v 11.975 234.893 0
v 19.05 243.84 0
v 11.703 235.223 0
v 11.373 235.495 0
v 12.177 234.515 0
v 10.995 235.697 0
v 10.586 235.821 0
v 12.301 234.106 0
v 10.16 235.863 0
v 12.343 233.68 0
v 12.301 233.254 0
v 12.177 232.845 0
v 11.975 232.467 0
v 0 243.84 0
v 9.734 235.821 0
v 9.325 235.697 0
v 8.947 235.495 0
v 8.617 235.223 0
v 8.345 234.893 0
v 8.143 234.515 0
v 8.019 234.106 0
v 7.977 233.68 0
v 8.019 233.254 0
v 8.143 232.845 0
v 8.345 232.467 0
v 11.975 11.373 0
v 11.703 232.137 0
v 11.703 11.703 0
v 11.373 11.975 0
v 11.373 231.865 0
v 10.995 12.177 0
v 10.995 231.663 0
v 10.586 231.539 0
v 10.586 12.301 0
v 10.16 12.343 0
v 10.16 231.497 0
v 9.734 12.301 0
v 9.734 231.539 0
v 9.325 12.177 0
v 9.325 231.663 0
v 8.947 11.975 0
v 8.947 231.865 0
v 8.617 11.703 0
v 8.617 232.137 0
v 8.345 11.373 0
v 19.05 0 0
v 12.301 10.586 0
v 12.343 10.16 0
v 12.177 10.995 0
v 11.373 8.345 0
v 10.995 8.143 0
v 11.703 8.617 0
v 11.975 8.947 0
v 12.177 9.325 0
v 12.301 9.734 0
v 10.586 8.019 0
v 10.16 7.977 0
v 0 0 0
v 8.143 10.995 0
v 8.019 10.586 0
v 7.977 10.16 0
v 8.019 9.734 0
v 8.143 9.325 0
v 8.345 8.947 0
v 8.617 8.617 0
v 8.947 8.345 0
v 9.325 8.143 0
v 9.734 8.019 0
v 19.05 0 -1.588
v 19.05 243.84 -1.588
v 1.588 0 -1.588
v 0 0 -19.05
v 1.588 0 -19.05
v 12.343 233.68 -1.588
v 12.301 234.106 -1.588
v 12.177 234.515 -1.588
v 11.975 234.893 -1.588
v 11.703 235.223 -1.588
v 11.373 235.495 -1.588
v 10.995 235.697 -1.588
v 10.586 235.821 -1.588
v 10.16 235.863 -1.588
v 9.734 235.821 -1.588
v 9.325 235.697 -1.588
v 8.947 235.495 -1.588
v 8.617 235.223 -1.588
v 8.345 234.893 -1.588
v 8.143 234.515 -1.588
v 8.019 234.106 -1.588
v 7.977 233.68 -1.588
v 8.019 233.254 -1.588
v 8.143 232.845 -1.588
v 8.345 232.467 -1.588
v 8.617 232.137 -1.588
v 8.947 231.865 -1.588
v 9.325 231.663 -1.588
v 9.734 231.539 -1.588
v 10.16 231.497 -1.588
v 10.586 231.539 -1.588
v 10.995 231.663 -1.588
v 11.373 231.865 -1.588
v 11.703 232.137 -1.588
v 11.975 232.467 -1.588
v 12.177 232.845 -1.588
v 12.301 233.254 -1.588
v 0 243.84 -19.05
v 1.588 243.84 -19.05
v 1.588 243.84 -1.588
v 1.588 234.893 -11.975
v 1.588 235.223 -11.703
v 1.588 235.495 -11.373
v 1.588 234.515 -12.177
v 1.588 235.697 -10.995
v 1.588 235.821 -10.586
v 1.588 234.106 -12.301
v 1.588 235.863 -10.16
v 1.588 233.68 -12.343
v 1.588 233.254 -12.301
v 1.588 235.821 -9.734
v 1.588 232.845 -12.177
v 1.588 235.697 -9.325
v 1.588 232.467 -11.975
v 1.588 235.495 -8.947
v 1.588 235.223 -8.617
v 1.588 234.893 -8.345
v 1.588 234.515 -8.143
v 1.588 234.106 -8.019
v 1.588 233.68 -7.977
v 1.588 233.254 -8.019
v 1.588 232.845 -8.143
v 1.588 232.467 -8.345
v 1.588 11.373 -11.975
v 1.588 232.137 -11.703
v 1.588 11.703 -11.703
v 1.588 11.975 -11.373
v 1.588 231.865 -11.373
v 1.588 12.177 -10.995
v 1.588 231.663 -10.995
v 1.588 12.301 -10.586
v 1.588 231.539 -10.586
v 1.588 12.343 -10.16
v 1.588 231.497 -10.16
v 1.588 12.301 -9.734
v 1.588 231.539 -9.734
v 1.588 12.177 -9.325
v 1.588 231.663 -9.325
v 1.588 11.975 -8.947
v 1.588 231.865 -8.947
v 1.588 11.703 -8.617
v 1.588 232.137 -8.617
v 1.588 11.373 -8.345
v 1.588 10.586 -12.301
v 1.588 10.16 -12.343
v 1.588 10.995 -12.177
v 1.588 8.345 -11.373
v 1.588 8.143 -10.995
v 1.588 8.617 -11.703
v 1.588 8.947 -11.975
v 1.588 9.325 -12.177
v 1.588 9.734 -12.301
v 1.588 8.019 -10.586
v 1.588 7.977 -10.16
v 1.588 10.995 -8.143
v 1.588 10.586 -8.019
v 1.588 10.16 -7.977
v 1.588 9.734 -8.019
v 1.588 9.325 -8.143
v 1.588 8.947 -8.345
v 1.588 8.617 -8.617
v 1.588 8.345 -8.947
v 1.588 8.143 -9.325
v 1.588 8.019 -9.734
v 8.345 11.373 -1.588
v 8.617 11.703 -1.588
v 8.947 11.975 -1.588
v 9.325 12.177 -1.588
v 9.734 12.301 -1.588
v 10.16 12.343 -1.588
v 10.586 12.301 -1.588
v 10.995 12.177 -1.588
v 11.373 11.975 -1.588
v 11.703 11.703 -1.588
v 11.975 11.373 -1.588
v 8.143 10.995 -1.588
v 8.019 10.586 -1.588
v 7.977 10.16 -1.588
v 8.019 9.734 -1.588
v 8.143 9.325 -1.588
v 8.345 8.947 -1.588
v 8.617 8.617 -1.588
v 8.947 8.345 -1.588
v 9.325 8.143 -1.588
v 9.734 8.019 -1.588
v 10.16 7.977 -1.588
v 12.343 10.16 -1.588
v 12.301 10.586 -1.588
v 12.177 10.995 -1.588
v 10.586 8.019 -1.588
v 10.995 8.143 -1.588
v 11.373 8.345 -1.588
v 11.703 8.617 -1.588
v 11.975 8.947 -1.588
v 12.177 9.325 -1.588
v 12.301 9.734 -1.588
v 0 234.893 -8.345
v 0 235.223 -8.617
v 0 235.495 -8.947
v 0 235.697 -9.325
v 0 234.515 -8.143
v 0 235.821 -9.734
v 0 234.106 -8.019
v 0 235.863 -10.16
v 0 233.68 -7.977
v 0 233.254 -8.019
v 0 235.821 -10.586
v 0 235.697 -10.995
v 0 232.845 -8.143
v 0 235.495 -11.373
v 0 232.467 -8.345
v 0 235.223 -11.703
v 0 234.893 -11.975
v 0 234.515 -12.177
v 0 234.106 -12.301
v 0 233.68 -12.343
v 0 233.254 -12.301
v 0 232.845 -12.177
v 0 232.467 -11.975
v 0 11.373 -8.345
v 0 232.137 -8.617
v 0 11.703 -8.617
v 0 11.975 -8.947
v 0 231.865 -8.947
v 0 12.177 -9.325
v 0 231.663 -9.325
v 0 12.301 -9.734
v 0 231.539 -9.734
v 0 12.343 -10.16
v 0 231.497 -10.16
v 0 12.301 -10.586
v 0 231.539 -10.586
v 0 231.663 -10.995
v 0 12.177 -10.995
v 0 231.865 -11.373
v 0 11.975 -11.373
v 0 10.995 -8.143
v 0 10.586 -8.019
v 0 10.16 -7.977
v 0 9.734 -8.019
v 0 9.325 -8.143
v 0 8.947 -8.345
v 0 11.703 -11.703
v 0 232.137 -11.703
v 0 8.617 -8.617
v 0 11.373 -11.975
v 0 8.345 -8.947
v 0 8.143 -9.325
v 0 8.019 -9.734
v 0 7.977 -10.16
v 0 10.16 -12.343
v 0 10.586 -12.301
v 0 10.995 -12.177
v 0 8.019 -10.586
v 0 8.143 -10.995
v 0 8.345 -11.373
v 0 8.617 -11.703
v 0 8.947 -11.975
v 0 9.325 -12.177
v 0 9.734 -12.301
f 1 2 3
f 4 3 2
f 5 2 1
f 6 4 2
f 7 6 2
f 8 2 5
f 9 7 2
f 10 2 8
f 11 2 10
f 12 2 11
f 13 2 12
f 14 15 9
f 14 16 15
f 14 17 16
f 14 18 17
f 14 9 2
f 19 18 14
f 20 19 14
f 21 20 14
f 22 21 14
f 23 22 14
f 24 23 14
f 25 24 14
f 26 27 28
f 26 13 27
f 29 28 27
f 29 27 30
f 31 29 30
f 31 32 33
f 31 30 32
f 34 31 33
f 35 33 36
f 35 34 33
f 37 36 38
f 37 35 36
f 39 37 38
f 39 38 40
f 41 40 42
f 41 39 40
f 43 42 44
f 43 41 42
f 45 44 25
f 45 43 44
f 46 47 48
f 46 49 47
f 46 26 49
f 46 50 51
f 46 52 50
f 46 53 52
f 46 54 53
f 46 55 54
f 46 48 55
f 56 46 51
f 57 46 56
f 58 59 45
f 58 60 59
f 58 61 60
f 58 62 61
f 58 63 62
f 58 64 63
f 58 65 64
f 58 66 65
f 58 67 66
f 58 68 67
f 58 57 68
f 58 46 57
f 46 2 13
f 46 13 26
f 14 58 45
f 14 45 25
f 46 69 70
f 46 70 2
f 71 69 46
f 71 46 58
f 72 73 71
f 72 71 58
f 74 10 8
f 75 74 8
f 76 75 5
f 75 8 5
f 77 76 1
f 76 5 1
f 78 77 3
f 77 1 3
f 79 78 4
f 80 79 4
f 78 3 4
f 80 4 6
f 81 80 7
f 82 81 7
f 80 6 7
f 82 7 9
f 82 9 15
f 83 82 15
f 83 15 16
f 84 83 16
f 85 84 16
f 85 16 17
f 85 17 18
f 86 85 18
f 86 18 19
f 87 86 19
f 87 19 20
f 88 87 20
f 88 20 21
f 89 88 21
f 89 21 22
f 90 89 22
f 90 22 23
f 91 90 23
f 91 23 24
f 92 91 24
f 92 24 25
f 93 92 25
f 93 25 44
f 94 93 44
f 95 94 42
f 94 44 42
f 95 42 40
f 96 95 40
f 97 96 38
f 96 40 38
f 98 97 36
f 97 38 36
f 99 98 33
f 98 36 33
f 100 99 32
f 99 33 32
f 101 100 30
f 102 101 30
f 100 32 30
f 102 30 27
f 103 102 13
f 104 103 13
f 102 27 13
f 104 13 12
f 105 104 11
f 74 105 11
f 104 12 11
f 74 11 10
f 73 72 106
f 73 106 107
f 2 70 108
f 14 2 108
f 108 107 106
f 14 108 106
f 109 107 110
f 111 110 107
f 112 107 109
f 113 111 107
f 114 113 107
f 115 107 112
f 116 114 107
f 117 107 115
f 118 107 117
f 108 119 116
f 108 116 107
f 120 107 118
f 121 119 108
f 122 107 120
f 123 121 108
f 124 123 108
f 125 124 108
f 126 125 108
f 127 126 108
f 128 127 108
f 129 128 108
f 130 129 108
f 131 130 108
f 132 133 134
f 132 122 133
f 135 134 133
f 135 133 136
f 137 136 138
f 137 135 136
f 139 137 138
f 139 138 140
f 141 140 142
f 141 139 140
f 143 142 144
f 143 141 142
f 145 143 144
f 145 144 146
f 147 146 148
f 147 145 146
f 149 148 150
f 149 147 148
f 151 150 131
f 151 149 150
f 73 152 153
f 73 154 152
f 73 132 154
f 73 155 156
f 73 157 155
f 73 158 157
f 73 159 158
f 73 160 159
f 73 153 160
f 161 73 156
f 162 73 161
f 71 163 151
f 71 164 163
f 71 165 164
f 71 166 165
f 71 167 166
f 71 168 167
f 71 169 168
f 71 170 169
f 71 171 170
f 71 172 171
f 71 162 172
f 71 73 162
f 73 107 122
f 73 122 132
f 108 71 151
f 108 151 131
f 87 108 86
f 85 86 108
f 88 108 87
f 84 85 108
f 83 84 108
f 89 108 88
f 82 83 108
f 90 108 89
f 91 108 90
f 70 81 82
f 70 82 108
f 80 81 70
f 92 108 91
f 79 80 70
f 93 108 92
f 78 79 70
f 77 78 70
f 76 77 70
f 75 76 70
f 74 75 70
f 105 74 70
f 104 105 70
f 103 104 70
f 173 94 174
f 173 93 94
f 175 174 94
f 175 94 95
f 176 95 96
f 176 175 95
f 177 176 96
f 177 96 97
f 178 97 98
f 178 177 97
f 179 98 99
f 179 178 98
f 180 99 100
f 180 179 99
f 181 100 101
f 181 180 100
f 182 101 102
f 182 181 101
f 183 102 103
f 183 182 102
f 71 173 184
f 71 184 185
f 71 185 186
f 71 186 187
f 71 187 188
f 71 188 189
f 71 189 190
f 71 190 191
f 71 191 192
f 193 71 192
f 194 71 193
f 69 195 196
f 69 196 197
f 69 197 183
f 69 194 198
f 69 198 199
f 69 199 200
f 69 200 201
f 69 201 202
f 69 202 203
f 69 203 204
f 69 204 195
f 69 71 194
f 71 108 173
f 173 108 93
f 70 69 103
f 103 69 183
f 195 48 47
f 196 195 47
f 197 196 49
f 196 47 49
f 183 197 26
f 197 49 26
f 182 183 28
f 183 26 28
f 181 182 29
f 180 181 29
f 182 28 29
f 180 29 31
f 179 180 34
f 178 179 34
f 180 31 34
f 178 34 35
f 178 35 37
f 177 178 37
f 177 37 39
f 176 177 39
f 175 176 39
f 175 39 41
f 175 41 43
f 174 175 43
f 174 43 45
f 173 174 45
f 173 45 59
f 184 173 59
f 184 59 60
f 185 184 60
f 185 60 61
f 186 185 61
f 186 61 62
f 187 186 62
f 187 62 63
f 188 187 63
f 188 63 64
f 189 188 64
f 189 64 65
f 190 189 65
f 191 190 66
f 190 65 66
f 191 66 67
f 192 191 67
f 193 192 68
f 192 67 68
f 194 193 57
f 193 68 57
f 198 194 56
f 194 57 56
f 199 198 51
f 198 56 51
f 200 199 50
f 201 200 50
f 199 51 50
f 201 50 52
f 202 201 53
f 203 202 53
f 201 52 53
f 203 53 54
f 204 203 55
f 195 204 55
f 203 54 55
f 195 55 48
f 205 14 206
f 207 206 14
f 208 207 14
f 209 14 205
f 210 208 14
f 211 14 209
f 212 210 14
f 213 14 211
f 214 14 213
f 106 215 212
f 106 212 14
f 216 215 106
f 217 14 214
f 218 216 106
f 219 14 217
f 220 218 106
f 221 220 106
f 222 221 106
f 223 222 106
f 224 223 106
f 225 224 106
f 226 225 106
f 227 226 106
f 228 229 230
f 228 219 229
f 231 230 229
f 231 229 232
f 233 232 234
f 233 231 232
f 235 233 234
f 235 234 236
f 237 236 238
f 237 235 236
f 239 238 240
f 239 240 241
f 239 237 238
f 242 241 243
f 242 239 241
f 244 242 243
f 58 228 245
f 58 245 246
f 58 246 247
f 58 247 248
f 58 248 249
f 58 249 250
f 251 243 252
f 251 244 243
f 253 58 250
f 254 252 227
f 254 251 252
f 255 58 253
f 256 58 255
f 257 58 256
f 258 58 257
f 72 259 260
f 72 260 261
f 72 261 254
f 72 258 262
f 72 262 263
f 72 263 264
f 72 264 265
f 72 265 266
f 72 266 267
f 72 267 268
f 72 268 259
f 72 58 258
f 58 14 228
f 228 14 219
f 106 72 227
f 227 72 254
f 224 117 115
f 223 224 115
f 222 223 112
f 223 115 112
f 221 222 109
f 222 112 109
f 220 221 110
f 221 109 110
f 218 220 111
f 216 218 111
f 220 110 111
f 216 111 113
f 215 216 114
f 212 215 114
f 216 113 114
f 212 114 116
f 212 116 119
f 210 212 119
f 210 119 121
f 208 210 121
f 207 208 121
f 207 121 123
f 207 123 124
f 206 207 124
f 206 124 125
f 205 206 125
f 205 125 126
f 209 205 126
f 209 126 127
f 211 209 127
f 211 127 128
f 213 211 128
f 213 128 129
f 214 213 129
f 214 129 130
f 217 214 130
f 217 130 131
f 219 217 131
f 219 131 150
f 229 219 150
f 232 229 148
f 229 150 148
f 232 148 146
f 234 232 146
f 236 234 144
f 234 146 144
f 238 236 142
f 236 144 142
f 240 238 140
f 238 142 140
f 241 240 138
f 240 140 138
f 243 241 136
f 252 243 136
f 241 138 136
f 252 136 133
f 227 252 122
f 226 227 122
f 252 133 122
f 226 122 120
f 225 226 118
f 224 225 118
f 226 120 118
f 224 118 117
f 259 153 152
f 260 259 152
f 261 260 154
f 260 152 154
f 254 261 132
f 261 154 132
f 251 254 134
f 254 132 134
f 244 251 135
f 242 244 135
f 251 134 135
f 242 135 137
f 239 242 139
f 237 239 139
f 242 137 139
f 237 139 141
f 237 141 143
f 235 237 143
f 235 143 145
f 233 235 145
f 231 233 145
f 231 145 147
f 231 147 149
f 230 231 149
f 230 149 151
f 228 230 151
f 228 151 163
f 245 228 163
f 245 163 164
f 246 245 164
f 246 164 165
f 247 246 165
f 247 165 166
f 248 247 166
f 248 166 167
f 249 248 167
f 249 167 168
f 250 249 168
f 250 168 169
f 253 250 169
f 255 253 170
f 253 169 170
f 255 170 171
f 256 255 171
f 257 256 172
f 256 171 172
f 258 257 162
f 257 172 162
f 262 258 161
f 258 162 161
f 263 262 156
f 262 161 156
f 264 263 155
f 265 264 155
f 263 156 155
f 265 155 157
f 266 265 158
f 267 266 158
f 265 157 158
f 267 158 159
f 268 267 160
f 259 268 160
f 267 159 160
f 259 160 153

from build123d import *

# Parameters (mm, degrees)
BOSS_EXTRUDE1_DEPTH = 243.84
SKETCH2_R           = 2.1828125
CUT_EXTRUDE1_DEPTH  = 2.54
SKETCH3_R           = 2.1828125
CUT_EXTRUDE2_DEPTH  = 246.205601499


with BuildPart() as part:
    # Sketch1 → Boss-Extrude1 (new body)
    with BuildSketch(Plane(origin=(0, 0, 0), x_dir=(1, 0, 0), z_dir=(0, 1, 0))):
        Polygon((0, 0), (0, 19.05), (1.5875, 19.05), (1.5875, 1.5875), (19.05, 1.5875), (19.05, 0), align=None)
    extrude(amount=BOSS_EXTRUDE1_DEPTH)

    # Sketch2 → Cut-Extrude1 (cut)
    with BuildSketch(Plane.XY):
        with Locations((10.16, 233.68)):
            Circle(SKETCH2_R)
        with Locations((10.16, 10.16)):
            Circle(SKETCH2_R)
    extrude(amount=-CUT_EXTRUDE1_DEPTH, mode=Mode.SUBTRACT)

    # Sketch3 → Cut-Extrude2 (cut, through all)
    with BuildSketch(Plane(origin=(1.5875, 0, 0), x_dir=(0, 0, -1), z_dir=(1, 0, 0))):
        with Locations((10.16, 233.68)):
            Circle(SKETCH3_R)
        with Locations((10.16, 10.16)):
            Circle(SKETCH3_R)
    extrude(amount=-CUT_EXTRUDE2_DEPTH, mode=Mode.SUBTRACT)


solid = part.part
